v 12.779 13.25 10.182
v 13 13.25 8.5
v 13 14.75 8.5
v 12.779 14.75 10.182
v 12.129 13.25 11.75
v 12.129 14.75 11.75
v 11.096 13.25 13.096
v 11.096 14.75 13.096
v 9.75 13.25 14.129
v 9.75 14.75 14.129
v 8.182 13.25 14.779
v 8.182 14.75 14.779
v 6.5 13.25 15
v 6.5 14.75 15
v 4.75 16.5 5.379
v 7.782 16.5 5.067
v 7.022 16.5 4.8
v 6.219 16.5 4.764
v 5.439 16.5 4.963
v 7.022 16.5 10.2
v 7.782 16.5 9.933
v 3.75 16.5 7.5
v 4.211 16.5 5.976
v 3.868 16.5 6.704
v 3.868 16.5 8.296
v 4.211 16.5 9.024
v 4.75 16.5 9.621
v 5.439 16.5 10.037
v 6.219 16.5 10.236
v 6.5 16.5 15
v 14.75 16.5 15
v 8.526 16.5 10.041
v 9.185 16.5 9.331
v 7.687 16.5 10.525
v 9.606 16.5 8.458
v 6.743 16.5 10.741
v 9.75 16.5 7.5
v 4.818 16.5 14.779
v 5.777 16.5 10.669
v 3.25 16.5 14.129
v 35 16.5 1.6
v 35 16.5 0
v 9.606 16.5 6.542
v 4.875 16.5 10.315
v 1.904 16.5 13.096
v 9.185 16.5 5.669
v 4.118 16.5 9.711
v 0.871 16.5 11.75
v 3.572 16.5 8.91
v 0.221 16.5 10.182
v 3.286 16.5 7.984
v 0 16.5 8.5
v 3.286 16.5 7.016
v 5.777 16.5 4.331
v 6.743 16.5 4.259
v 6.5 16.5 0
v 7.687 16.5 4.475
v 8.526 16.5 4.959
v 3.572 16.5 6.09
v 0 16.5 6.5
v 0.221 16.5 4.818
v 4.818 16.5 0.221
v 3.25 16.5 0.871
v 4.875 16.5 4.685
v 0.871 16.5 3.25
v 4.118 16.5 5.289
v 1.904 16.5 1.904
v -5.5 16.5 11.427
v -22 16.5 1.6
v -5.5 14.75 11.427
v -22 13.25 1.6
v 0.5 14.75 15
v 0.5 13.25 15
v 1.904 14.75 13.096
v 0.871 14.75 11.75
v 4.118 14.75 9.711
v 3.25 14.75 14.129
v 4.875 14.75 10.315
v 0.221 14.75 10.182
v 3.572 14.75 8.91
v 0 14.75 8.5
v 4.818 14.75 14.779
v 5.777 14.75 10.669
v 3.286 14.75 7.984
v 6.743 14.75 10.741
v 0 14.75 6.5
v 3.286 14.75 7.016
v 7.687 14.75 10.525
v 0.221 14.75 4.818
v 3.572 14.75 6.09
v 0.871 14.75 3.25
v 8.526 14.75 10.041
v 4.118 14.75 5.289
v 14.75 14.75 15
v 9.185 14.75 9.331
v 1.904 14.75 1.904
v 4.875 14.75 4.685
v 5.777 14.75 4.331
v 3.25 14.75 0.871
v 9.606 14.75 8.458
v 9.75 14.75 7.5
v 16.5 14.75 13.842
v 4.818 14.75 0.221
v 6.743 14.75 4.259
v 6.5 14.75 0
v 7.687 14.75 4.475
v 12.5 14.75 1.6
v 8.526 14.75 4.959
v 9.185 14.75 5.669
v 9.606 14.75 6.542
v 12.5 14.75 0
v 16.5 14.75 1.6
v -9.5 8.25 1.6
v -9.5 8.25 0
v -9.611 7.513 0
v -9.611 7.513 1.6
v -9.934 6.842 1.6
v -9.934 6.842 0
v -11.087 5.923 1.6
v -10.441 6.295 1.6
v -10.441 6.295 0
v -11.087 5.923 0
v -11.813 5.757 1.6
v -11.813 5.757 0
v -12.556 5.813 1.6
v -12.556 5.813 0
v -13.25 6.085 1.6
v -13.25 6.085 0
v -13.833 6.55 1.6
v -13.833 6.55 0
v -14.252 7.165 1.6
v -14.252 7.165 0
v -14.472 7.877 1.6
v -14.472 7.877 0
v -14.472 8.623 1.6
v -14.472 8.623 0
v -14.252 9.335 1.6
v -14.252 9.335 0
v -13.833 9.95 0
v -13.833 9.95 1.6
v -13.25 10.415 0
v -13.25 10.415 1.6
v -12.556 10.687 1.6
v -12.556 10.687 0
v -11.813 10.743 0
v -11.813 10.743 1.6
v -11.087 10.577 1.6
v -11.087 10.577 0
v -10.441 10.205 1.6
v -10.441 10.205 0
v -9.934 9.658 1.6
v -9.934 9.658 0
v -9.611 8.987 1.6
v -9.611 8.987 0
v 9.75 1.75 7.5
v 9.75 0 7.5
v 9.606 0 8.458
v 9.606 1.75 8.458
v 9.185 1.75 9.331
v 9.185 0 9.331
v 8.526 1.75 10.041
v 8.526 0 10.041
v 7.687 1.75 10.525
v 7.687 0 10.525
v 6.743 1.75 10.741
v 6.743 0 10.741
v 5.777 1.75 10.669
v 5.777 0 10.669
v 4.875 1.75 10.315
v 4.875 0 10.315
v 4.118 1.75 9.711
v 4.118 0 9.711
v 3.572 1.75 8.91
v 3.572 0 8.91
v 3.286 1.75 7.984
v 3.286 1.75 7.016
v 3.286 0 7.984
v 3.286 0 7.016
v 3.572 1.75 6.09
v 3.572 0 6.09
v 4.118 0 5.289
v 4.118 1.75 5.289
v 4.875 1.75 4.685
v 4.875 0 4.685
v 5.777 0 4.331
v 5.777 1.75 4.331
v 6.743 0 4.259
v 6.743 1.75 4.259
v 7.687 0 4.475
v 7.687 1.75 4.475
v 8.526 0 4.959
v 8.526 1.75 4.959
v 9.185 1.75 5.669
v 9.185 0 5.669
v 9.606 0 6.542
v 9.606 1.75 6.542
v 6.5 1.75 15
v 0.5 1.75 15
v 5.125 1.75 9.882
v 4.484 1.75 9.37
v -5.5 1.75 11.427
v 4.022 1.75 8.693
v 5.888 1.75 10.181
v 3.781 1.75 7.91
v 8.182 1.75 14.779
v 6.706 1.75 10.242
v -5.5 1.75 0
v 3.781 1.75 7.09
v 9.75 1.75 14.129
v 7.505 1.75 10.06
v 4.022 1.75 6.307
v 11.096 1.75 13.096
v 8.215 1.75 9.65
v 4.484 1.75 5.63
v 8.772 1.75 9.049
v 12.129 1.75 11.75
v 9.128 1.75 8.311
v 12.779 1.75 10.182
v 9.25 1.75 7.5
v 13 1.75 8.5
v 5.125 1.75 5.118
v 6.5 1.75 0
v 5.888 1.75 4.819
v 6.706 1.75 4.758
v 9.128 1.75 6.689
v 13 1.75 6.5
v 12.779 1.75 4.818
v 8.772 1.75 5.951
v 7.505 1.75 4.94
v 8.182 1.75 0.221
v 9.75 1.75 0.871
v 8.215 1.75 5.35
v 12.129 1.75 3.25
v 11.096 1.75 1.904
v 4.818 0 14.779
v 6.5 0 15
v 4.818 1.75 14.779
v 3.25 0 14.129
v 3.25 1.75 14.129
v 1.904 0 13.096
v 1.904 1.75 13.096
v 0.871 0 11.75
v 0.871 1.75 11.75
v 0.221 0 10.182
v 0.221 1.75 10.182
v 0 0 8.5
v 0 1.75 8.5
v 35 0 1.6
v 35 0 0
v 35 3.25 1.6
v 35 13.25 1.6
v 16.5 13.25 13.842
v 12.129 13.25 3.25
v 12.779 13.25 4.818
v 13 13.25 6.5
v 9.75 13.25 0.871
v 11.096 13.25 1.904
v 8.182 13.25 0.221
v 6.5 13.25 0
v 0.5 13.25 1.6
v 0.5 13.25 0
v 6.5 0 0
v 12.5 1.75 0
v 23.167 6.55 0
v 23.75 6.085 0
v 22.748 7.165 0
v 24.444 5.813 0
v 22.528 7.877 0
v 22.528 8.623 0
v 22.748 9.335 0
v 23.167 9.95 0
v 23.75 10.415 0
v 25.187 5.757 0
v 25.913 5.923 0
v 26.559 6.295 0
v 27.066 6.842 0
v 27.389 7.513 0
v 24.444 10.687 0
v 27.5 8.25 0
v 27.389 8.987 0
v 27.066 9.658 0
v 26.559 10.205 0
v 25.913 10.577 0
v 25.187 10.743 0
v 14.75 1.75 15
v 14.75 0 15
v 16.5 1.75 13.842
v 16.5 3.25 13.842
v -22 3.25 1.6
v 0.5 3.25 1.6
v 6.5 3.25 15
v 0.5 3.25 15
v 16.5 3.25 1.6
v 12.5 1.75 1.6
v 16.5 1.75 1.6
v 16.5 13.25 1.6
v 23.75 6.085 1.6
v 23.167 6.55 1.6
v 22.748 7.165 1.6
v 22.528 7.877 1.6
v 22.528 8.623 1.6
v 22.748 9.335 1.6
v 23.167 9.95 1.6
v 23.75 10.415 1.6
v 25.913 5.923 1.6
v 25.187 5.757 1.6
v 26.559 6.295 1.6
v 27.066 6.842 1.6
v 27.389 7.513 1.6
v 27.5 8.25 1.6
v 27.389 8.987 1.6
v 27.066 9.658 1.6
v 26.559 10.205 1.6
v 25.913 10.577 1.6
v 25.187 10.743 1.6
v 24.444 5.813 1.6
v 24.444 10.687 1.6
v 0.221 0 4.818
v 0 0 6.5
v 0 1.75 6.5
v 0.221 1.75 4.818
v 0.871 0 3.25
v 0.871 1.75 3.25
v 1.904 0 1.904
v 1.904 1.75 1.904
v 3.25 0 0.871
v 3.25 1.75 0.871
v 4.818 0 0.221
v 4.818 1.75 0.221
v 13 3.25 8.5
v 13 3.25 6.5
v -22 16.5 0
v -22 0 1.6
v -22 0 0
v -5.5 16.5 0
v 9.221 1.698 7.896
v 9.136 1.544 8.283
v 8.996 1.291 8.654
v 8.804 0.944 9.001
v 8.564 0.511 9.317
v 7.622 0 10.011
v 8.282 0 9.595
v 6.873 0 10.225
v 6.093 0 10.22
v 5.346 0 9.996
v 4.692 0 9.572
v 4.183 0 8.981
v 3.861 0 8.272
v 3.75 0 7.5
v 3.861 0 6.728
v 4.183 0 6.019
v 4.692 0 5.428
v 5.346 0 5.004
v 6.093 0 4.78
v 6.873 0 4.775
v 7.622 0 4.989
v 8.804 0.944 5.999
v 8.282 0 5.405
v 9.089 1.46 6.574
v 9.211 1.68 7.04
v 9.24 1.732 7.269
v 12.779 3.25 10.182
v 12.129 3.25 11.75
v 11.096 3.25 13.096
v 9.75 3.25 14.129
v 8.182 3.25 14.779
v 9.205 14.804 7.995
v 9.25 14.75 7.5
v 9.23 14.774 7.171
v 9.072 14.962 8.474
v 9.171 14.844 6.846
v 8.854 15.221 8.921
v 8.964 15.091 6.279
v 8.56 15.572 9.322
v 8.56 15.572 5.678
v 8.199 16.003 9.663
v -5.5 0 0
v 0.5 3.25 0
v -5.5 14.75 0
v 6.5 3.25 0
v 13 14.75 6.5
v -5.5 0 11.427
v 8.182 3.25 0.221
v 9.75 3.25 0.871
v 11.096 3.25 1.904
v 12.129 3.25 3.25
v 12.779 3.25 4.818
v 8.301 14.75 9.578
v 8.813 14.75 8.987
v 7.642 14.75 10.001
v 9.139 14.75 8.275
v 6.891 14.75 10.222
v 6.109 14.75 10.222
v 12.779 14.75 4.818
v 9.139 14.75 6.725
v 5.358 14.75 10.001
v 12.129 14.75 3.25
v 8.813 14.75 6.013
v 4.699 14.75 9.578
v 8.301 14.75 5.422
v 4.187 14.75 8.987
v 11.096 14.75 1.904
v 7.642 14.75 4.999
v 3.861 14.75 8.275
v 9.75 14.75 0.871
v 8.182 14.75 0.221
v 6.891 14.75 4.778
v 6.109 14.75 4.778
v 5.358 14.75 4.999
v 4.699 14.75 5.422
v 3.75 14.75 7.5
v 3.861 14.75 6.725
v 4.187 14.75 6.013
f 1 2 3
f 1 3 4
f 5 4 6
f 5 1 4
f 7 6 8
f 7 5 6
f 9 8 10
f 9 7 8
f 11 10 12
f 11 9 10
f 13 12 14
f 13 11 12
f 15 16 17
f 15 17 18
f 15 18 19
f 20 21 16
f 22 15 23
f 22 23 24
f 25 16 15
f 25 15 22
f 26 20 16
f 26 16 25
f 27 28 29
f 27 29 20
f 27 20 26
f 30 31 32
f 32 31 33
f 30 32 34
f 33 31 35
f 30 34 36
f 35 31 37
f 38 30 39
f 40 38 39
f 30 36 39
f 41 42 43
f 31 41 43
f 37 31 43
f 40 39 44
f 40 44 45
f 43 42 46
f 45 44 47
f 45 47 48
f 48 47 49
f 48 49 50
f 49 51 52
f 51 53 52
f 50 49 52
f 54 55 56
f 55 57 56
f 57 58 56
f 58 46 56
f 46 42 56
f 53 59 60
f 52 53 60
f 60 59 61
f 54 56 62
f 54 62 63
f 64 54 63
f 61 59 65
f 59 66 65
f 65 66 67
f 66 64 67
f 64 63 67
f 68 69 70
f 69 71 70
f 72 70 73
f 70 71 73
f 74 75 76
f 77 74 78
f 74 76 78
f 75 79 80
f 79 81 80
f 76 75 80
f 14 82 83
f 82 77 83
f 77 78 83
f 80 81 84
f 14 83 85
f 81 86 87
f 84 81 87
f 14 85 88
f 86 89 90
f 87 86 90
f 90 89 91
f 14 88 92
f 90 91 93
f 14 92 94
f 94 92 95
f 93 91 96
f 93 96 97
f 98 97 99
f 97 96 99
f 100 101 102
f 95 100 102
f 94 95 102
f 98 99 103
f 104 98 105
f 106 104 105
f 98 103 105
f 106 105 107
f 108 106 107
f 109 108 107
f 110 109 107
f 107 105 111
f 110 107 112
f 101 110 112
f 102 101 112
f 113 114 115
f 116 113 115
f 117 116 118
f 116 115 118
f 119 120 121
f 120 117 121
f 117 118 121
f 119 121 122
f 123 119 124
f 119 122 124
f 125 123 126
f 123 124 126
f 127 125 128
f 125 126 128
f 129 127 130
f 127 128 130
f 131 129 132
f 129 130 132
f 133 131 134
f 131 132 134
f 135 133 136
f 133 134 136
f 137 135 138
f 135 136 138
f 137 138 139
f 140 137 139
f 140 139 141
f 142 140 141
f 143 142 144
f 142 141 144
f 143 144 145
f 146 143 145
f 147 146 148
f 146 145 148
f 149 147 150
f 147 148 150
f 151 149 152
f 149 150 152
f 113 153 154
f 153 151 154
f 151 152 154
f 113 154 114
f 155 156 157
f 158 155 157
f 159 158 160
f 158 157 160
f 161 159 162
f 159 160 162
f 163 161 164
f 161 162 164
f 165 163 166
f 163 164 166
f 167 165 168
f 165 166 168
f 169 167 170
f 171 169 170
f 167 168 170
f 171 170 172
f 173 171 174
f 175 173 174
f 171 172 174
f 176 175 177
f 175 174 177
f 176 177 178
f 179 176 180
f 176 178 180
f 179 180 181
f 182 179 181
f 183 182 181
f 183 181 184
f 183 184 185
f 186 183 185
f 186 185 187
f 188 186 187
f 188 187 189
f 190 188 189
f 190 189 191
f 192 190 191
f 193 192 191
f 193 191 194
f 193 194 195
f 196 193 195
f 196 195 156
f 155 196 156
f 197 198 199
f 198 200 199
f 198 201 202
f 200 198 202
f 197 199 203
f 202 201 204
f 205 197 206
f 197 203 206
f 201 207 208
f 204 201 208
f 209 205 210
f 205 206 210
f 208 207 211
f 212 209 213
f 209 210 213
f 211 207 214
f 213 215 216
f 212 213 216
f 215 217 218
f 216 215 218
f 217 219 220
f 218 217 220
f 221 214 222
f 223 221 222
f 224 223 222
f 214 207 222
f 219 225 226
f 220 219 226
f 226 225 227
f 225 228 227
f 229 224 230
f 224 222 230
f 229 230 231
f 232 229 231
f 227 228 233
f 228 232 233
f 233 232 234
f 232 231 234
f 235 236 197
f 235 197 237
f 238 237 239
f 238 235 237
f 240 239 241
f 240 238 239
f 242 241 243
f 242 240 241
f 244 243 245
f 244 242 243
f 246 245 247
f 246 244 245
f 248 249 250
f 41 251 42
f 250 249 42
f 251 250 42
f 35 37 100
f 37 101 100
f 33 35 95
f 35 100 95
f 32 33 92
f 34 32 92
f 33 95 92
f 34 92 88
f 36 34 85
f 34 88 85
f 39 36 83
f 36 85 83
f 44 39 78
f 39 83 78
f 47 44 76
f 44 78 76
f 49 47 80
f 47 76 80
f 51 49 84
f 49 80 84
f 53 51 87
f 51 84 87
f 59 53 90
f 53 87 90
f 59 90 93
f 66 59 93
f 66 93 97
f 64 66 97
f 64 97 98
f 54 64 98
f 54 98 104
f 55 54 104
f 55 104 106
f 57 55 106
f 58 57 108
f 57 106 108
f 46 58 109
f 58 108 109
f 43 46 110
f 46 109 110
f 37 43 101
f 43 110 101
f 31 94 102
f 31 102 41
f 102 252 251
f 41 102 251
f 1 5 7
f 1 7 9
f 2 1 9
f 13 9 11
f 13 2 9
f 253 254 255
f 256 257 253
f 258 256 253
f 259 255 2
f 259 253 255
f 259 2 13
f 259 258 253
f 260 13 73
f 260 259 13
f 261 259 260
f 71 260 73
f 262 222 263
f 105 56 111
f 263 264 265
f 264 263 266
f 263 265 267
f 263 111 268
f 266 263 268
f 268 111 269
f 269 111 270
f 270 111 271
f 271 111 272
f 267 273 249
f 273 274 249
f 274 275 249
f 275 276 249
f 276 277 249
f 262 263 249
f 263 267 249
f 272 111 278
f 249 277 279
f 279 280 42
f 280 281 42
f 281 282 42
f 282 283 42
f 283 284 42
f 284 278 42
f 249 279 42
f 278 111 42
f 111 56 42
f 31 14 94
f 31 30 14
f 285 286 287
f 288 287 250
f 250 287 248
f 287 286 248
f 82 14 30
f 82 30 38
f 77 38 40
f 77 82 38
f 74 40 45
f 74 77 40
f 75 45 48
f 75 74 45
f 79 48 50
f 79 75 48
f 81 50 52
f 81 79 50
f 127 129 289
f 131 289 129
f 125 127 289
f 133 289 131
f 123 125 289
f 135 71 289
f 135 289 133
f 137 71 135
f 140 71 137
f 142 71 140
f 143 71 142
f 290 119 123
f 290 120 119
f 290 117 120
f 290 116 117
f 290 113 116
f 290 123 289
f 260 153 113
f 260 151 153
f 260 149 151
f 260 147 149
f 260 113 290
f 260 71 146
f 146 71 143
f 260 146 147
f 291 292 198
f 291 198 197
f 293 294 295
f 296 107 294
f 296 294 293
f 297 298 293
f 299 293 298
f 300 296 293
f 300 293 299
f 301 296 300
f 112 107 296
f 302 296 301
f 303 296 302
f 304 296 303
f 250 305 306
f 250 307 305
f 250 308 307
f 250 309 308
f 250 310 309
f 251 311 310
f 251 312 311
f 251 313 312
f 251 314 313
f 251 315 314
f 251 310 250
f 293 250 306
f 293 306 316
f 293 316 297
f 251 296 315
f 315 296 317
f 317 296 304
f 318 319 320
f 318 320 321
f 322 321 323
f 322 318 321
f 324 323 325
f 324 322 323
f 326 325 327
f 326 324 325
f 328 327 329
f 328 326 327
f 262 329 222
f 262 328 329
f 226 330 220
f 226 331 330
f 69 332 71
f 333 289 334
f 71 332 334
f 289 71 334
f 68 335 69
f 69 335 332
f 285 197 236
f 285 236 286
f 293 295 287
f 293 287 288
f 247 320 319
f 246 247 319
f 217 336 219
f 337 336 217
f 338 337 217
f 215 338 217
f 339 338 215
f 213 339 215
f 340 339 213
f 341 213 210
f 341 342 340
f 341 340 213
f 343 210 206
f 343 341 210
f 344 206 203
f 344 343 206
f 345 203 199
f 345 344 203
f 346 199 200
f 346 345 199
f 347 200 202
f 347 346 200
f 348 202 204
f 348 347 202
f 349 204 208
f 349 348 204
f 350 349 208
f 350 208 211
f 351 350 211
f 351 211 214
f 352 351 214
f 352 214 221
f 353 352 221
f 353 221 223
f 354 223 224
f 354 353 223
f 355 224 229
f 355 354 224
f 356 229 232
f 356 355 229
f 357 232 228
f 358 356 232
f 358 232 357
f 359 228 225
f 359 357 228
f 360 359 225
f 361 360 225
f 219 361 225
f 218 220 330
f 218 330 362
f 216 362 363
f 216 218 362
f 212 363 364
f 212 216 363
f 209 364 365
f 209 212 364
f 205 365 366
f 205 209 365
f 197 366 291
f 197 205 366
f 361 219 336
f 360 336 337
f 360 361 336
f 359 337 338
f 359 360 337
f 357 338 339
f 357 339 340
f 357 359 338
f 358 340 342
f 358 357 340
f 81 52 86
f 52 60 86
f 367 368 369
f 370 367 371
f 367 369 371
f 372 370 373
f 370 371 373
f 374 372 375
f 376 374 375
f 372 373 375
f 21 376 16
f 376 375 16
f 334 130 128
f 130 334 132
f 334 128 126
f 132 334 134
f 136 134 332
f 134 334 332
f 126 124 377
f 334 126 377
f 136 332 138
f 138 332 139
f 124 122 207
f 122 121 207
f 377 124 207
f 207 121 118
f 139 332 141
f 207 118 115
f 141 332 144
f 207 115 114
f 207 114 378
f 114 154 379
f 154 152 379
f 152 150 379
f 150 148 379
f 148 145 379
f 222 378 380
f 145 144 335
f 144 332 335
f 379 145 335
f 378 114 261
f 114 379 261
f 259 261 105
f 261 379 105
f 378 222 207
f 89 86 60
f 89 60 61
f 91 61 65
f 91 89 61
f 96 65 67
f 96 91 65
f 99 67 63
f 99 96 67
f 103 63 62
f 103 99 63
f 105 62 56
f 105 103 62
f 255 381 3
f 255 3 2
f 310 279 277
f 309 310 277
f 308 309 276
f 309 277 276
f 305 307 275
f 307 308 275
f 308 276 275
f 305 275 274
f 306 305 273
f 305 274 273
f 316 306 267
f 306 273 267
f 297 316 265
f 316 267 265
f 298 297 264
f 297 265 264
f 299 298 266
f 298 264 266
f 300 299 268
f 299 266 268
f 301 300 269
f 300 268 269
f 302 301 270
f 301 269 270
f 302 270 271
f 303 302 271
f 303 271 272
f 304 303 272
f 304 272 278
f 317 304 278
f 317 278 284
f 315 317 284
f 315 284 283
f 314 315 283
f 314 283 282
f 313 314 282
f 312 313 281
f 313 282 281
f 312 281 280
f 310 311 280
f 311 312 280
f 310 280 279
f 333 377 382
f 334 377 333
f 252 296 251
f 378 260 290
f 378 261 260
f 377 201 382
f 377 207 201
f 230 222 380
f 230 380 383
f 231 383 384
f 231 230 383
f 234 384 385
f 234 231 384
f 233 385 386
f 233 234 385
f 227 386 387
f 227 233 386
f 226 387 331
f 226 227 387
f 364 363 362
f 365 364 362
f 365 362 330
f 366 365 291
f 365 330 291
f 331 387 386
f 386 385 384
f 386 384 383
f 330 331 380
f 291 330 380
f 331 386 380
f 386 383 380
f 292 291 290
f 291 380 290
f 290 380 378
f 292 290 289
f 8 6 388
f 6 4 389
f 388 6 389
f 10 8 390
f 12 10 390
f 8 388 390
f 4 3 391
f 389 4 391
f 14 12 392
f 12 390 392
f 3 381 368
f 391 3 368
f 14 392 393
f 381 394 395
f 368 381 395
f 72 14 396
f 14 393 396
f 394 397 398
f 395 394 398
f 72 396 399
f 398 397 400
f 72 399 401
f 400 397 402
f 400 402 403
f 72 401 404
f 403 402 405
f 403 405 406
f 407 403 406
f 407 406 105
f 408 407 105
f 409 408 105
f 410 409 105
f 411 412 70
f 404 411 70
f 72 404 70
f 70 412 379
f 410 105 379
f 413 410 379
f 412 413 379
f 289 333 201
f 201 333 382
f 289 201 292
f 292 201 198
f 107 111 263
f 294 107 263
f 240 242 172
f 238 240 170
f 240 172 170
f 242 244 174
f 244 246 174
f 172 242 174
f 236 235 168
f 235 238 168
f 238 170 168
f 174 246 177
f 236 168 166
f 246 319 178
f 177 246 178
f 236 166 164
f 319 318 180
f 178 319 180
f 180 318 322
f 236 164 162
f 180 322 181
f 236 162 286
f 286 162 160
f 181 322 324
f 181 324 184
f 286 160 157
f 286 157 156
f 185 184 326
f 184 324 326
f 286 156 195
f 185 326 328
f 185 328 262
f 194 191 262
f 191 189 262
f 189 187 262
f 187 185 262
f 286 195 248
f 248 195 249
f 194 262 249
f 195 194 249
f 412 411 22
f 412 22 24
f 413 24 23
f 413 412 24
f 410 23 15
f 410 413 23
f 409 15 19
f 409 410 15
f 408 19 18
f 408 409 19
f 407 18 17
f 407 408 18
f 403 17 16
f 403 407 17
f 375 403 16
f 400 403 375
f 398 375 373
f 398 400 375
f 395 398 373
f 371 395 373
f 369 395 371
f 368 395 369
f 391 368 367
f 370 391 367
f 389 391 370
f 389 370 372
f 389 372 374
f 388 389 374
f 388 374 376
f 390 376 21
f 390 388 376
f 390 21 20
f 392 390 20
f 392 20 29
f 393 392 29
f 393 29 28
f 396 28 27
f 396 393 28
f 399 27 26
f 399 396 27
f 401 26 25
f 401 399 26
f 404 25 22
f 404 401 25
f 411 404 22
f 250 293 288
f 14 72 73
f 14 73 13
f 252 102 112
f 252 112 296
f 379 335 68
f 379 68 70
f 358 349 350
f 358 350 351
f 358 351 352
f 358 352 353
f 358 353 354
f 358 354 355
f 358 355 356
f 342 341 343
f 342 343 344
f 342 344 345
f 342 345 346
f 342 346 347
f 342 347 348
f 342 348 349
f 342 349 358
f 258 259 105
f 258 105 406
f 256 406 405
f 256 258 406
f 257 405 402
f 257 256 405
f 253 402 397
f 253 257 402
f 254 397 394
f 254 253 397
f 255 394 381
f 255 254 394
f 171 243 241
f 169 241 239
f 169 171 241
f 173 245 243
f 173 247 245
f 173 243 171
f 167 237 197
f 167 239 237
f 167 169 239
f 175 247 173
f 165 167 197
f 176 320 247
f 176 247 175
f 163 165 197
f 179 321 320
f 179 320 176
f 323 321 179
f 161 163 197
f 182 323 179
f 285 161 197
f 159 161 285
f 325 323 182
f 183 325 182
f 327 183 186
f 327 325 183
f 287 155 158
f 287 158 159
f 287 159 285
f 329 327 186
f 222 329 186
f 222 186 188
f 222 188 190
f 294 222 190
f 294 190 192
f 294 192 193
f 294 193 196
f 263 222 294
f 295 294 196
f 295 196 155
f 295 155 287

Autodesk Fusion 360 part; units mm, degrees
sketch "Sketch1" plane through (0, 0, 0) normal (0, 0, 1) x (1, 0, 0)
  line L0 (0, 0) -> (35, 0)
  line L1 (35, 0) -> (35, 16.5)
  line L2 (35, 16.5) -> (0, 16.5)
  line L3 (0, 16.5) -> (0, 0)
  line L4 (0, 14.75) -> (16.5, 14.75)
  line L5 (16.5, 14.75) -> (16.5, 13.25)
  line L6 (16.5, 13.25) -> (35, 13.25)
  line L7 (0, 1.75) -> (16.5, 1.75)
  line L8 (16.5, 1.75) -> (16.5, 3.25)
  line L9 (16.5, 3.25) -> (35, 3.25)
  line L10 (6.5, 16.5) -> (6.5, 0) construction
  line L11 (0, 8.25) -> (35, 8.25) construction
  line L12 (16.5, 14.75) -> (16.5, 16.5) construction
  line L13 (16.5, 1.75) -> (16.5, 0) construction
  line L14 (12.5, 14.75) -> (12.5, 1.75)
  circle A0 centre (25, 8.25) radius 2.5
  dimension "d1" = 35
  dimension "d2" = 16.5
  dimension "d3" = 6.5
  dimension "d4" = 10
  dimension "d5" = 10
  dimension "d7" = 13
  dimension "d9" = 10
  dimension "d10" = 6
  dimension "d11" = 5
  dimension "d12" = 10
extrude "Extrude1" add sketch "Sketch1" along normal blind 1.6 contours L1 L4 L5 L6 L7 L8 L9 L14 makes body 1
extrude "Extrude2" add sketch "Sketch1" along normal blind 15 contours L0 L1 L3 L7 L8 L9 | L1 L2 L3 L4 L5 L6 bodies 1
sketch "Sketch2" plane through (0, 0, 0) normal (0, -1, 0) x (1, 0, 0)
  line L0 (0, 0) -> (35, 0)
  line L1 (35, 0) -> (35, 15)
  line L2 (35, 15) -> (0, 15)
  line L3 (0, 15) -> (0, 0)
  line L4 (0, 8.5) -> (0, 6.5)
  arc A0 (0, 6.5) -> (6.5, 0) centre (6.5, 6.5) ccw
  arc A1 (6.5, 15) -> (0, 8.5) centre (6.5, 8.5) ccw
  line L5 (6.5, 15) -> (14.7505, 15)
  line L6 (14.7505, 15) -> (35, 1.6)
  line L7 (35, 1.6) -> (35, 0)
  line L8 (6.5, 0) -> (35, 0)
  line L9 (0, 0) -> (35, 0)
  circle A2 centre (6.5, 7.5) radius 3.25
  line L10 (22.5, 1.6) -> (27.5, 1.6)
  line L11 (16.5, 1.6) -> (12.5, 1.6)
  line L12 (12.5, 1.6) -> (16.5, 1.6)
  line L13 (16.5, 1.6) -> (35, 1.6)
  line L14 (35, 1.6) -> (16.5, 1.6)
  line L15 (6.5, 0) -> (6.5, 15)
  point P0 (6.5, 0)
  dimension "d17" = 6.5
extrude "Extrude3" cut sketch "Sketch2" against normal up to surface (16.5 mm away) contours L0 L3 A0 L9 | A2 L15 | A2 L15 | L2 L3 A1 | L1 L2 L6 bodies 1
copy_body "Body->Comp1" bodies 1 removing the originals makes body 2 in component "end-1"
sketch "Sketch1 (2)" plane through (0, 0, 0) normal (0, 0, 1) x (1, 0, 0) in component "end-2"
  circle A0 centre (10, 8.25) radius 2.5
  line L0 (0, 8.25) -> (35, 8.25) construction
  line L1 (0, 16.5) -> (0, 0)
  line L2 (16.5, 13.25) -> (35, 13.25)
  line L3 (16.5, 14.75) -> (16.5, 16.5) construction
  line L4 (28.5, 14.75) -> (28.5, 1.75) construction
  line L5 (16.5, 1.75) -> (16.5, 0) construction
  line L6 (16.5, 3.25) -> (35, 3.25)
  line L7 (35, 14.75) -> (16.5, 14.75)
  line L8 (16.5, 14.75) -> (16.5, 15.0527)
  line L9 (16.5, 16.5) -> (16.5, 14.75)
  line L10 (16.5, 16.5) -> (0, 16.5)
  line L11 (16.5, 13.25) -> (0, 13.25)
  line L12 (16.5, 3.25) -> (0, 3.25)
  line L13 (16.5, 1.75) -> (35, 1.75)
  line L14 (16.5, 1.75) -> (16.5, 0)
  line L15 (16.5, 0) -> (0, 0)
  line L16 (35, 14.75) -> (35, 13.25)
  line L17 (35, 14.75) -> (35, 3.25)
  line L18 (35, 14.75) -> (35, 1.75)
  line L19 (22.5, 14.75) -> (22.5, 1.75)
  dimension "d21" = 16.5
  dimension "d26" = 10
  dimension "d28" = 5
  dimension "d31" = 10
  dimension "d32" = 6
  dimension "d33" = 6.5
extrude "Extrude1'" add sketch "Sketch1 (2)" along normal blind 1.6 separate body contours L1 L2 L6 L11 L12 L19 makes body 3 in component "end-2"
extrude "Extrude2'" add sketch "Sketch1 (2)" along normal blind 15 contours L1 L2 L7 L8 L9 L10 L11 L19 | L1 L6 L12 L13 L14 L15 L19 | L2 L7 L16 L17 L18 L19 | L6 L13 L18 L19 bodies 3 in component "end-2"
sketch "Sketch2 (2)" plane through (0, 0, 0) normal (0, -1, 0) x (1, 0, 0) in component "end-2"
  line L0 (0, 0) -> (16.5, 0)
  line L1 (16.5, 0) -> (16.5, 15)
  line L2 (16.5, 15) -> (0, 15)
  line L3 (0, 15) -> (0, 0)
  line L4 (16.5, 0) -> (35, 0)
  line L5 (35, 0) -> (35, 15)
  line L6 (35, 15) -> (16.5, 15)
  line L7 (16.5, 15) -> (16.5, 0)
  line L8 (28.5, 0) -> (28.5, 15) construction
  line L9 (0, 1.6) -> (22.5, 15)
  arc A0 (35, 8.5) -> (28.5, 15) centre (28.5, 8.5) ccw
  line L10 (35, 8.5) -> (35, 6.5)
  arc A1 (28.5, 0) -> (35, 6.5) centre (28.5, 6.5) ccw
  line L11 (22.5, 15) -> (28.5, 15)
  line L12 (28.5, 0) -> (0, 0)
  circle A2 centre (28.5, 7.5) radius 2.75
  line L13 (22.5, 0) -> (22.5, 15)
  point P0 (28.5, 0)
  point P1 (0, 1.6)
  point P2 (22.5, 0)
  dimension "d38" = 5.5
extrude "Extrude3'" cut sketch "Sketch2 (2)" against normal up to surface (16.5 mm away) contours L1 L2 L3 L7 L9 | L1 L6 L7 L9 | L4 L5 A1 | L5 L6 A0 bodies 3 in component "end-2"
extrude "Extrude4" add sketch "Sketch2 (2)" against normal up to surface (1.75 mm away) contours A2 bodies 3 in component "end-2"
sketch "Sketch3" plane through (0, 14.75, 0) normal (0, 1, 0) x (-1, 0, 0) in component "end-2"
  line L0 (-16.5, 11.4267) -> (-22.5, 15)
  line L1 (-22.5, 15) -> (-28.5, 15)
  arc A0 (-28.5, 15) -> (-35, 8.5) centre (-28.5, 8.5) ccw
  line L2 (-35, 8.5) -> (-35, 6.5)
  arc A1 (-35, 6.5) -> (-28.5, 0) centre (-28.5, 6.5) ccw
  line L3 (-28.5, 0) -> (-16.5, 0)
  line L4 (-16.5, 0) -> (-16.5, 11.4267)
  circle A2 centre (-28.5, 7.5) radius 2.75
extrude "Extrude5" add sketch "Sketch3" along normal up to surface (1.75 mm away) contours A2 bodies 3 in component "end-2"
sketch "Sketch4" plane through (0, 0, 0) normal (0, 0, -1) x (1, 0, 0) in component "end-2"
  line L0 (28.5, -3.25) -> (28.5, -1.75)
  line L1 (28.5, -1.75) -> (16.5, -1.75)
  line L2 (16.5, -1.75) -> (16.5, 0)
  line L3 (16.5, 0) -> (0, 0)
  line L4 (0, 0) -> (0, -16.5)
  line L5 (0, -16.5) -> (16.5, -16.5)
  line L6 (16.5, -16.5) -> (16.5, -14.75)
  line L7 (16.5, -14.75) -> (28.5, -14.75)
  line L8 (28.5, -14.75) -> (28.5, -13.25)
  line L9 (28.5, -13.25) -> (22.5, -13.25)
  line L10 (22.5, -13.25) -> (22.5, -3.25)
  line L11 (22.5, -3.25) -> (28.5, -3.25)
  circle A0 centre (10, -8.25) radius 2.5
  line L12 (31.25, -16.5) -> (25.75, -16.5)
  line L13 (31.25, -14.75) -> (25.75, -14.75)
  line L14 (31.25, 0) -> (25.75, 0)
  line L15 (25.75, -1.75) -> (31.25, -1.75)
  line L16 (31.25, -14.75) -> (29.7816, -16.5)
  line L17 (31.25, -14.75) -> (34.0632, -14.75) construction
  line L18 (25.75, -16.5) -> (25.75, -14.75)
  line L19 (29.7816, -16.5) -> (31.25, -16.5)
  line L20 (31.25, -14.75) -> (31.25, -16.5)
  line L21 (31.25, -1.75) -> (30.2816, 0)
  line L22 (30.2816, 0) -> (31.25, 0)
  line L23 (31.25, 0) -> (31.25, -1.75)
  dimension "d45" = 130
extrude "Extrude6" cut sketch "Sketch4" against normal up to surface (15 mm away) contours L14 L21 L22 L23 | L12 L16 L19 L20 bodies 3 in component "end-2"
component "end-1" placed x (1, 0, 0) y (0, 1, 0) z (0, 0, 1) at (0, 0, 0)
component "end-2" placed x (1, 0, 0) y (0, 1, 0) z (0, 0, 1) at (-22, 0, 0)
